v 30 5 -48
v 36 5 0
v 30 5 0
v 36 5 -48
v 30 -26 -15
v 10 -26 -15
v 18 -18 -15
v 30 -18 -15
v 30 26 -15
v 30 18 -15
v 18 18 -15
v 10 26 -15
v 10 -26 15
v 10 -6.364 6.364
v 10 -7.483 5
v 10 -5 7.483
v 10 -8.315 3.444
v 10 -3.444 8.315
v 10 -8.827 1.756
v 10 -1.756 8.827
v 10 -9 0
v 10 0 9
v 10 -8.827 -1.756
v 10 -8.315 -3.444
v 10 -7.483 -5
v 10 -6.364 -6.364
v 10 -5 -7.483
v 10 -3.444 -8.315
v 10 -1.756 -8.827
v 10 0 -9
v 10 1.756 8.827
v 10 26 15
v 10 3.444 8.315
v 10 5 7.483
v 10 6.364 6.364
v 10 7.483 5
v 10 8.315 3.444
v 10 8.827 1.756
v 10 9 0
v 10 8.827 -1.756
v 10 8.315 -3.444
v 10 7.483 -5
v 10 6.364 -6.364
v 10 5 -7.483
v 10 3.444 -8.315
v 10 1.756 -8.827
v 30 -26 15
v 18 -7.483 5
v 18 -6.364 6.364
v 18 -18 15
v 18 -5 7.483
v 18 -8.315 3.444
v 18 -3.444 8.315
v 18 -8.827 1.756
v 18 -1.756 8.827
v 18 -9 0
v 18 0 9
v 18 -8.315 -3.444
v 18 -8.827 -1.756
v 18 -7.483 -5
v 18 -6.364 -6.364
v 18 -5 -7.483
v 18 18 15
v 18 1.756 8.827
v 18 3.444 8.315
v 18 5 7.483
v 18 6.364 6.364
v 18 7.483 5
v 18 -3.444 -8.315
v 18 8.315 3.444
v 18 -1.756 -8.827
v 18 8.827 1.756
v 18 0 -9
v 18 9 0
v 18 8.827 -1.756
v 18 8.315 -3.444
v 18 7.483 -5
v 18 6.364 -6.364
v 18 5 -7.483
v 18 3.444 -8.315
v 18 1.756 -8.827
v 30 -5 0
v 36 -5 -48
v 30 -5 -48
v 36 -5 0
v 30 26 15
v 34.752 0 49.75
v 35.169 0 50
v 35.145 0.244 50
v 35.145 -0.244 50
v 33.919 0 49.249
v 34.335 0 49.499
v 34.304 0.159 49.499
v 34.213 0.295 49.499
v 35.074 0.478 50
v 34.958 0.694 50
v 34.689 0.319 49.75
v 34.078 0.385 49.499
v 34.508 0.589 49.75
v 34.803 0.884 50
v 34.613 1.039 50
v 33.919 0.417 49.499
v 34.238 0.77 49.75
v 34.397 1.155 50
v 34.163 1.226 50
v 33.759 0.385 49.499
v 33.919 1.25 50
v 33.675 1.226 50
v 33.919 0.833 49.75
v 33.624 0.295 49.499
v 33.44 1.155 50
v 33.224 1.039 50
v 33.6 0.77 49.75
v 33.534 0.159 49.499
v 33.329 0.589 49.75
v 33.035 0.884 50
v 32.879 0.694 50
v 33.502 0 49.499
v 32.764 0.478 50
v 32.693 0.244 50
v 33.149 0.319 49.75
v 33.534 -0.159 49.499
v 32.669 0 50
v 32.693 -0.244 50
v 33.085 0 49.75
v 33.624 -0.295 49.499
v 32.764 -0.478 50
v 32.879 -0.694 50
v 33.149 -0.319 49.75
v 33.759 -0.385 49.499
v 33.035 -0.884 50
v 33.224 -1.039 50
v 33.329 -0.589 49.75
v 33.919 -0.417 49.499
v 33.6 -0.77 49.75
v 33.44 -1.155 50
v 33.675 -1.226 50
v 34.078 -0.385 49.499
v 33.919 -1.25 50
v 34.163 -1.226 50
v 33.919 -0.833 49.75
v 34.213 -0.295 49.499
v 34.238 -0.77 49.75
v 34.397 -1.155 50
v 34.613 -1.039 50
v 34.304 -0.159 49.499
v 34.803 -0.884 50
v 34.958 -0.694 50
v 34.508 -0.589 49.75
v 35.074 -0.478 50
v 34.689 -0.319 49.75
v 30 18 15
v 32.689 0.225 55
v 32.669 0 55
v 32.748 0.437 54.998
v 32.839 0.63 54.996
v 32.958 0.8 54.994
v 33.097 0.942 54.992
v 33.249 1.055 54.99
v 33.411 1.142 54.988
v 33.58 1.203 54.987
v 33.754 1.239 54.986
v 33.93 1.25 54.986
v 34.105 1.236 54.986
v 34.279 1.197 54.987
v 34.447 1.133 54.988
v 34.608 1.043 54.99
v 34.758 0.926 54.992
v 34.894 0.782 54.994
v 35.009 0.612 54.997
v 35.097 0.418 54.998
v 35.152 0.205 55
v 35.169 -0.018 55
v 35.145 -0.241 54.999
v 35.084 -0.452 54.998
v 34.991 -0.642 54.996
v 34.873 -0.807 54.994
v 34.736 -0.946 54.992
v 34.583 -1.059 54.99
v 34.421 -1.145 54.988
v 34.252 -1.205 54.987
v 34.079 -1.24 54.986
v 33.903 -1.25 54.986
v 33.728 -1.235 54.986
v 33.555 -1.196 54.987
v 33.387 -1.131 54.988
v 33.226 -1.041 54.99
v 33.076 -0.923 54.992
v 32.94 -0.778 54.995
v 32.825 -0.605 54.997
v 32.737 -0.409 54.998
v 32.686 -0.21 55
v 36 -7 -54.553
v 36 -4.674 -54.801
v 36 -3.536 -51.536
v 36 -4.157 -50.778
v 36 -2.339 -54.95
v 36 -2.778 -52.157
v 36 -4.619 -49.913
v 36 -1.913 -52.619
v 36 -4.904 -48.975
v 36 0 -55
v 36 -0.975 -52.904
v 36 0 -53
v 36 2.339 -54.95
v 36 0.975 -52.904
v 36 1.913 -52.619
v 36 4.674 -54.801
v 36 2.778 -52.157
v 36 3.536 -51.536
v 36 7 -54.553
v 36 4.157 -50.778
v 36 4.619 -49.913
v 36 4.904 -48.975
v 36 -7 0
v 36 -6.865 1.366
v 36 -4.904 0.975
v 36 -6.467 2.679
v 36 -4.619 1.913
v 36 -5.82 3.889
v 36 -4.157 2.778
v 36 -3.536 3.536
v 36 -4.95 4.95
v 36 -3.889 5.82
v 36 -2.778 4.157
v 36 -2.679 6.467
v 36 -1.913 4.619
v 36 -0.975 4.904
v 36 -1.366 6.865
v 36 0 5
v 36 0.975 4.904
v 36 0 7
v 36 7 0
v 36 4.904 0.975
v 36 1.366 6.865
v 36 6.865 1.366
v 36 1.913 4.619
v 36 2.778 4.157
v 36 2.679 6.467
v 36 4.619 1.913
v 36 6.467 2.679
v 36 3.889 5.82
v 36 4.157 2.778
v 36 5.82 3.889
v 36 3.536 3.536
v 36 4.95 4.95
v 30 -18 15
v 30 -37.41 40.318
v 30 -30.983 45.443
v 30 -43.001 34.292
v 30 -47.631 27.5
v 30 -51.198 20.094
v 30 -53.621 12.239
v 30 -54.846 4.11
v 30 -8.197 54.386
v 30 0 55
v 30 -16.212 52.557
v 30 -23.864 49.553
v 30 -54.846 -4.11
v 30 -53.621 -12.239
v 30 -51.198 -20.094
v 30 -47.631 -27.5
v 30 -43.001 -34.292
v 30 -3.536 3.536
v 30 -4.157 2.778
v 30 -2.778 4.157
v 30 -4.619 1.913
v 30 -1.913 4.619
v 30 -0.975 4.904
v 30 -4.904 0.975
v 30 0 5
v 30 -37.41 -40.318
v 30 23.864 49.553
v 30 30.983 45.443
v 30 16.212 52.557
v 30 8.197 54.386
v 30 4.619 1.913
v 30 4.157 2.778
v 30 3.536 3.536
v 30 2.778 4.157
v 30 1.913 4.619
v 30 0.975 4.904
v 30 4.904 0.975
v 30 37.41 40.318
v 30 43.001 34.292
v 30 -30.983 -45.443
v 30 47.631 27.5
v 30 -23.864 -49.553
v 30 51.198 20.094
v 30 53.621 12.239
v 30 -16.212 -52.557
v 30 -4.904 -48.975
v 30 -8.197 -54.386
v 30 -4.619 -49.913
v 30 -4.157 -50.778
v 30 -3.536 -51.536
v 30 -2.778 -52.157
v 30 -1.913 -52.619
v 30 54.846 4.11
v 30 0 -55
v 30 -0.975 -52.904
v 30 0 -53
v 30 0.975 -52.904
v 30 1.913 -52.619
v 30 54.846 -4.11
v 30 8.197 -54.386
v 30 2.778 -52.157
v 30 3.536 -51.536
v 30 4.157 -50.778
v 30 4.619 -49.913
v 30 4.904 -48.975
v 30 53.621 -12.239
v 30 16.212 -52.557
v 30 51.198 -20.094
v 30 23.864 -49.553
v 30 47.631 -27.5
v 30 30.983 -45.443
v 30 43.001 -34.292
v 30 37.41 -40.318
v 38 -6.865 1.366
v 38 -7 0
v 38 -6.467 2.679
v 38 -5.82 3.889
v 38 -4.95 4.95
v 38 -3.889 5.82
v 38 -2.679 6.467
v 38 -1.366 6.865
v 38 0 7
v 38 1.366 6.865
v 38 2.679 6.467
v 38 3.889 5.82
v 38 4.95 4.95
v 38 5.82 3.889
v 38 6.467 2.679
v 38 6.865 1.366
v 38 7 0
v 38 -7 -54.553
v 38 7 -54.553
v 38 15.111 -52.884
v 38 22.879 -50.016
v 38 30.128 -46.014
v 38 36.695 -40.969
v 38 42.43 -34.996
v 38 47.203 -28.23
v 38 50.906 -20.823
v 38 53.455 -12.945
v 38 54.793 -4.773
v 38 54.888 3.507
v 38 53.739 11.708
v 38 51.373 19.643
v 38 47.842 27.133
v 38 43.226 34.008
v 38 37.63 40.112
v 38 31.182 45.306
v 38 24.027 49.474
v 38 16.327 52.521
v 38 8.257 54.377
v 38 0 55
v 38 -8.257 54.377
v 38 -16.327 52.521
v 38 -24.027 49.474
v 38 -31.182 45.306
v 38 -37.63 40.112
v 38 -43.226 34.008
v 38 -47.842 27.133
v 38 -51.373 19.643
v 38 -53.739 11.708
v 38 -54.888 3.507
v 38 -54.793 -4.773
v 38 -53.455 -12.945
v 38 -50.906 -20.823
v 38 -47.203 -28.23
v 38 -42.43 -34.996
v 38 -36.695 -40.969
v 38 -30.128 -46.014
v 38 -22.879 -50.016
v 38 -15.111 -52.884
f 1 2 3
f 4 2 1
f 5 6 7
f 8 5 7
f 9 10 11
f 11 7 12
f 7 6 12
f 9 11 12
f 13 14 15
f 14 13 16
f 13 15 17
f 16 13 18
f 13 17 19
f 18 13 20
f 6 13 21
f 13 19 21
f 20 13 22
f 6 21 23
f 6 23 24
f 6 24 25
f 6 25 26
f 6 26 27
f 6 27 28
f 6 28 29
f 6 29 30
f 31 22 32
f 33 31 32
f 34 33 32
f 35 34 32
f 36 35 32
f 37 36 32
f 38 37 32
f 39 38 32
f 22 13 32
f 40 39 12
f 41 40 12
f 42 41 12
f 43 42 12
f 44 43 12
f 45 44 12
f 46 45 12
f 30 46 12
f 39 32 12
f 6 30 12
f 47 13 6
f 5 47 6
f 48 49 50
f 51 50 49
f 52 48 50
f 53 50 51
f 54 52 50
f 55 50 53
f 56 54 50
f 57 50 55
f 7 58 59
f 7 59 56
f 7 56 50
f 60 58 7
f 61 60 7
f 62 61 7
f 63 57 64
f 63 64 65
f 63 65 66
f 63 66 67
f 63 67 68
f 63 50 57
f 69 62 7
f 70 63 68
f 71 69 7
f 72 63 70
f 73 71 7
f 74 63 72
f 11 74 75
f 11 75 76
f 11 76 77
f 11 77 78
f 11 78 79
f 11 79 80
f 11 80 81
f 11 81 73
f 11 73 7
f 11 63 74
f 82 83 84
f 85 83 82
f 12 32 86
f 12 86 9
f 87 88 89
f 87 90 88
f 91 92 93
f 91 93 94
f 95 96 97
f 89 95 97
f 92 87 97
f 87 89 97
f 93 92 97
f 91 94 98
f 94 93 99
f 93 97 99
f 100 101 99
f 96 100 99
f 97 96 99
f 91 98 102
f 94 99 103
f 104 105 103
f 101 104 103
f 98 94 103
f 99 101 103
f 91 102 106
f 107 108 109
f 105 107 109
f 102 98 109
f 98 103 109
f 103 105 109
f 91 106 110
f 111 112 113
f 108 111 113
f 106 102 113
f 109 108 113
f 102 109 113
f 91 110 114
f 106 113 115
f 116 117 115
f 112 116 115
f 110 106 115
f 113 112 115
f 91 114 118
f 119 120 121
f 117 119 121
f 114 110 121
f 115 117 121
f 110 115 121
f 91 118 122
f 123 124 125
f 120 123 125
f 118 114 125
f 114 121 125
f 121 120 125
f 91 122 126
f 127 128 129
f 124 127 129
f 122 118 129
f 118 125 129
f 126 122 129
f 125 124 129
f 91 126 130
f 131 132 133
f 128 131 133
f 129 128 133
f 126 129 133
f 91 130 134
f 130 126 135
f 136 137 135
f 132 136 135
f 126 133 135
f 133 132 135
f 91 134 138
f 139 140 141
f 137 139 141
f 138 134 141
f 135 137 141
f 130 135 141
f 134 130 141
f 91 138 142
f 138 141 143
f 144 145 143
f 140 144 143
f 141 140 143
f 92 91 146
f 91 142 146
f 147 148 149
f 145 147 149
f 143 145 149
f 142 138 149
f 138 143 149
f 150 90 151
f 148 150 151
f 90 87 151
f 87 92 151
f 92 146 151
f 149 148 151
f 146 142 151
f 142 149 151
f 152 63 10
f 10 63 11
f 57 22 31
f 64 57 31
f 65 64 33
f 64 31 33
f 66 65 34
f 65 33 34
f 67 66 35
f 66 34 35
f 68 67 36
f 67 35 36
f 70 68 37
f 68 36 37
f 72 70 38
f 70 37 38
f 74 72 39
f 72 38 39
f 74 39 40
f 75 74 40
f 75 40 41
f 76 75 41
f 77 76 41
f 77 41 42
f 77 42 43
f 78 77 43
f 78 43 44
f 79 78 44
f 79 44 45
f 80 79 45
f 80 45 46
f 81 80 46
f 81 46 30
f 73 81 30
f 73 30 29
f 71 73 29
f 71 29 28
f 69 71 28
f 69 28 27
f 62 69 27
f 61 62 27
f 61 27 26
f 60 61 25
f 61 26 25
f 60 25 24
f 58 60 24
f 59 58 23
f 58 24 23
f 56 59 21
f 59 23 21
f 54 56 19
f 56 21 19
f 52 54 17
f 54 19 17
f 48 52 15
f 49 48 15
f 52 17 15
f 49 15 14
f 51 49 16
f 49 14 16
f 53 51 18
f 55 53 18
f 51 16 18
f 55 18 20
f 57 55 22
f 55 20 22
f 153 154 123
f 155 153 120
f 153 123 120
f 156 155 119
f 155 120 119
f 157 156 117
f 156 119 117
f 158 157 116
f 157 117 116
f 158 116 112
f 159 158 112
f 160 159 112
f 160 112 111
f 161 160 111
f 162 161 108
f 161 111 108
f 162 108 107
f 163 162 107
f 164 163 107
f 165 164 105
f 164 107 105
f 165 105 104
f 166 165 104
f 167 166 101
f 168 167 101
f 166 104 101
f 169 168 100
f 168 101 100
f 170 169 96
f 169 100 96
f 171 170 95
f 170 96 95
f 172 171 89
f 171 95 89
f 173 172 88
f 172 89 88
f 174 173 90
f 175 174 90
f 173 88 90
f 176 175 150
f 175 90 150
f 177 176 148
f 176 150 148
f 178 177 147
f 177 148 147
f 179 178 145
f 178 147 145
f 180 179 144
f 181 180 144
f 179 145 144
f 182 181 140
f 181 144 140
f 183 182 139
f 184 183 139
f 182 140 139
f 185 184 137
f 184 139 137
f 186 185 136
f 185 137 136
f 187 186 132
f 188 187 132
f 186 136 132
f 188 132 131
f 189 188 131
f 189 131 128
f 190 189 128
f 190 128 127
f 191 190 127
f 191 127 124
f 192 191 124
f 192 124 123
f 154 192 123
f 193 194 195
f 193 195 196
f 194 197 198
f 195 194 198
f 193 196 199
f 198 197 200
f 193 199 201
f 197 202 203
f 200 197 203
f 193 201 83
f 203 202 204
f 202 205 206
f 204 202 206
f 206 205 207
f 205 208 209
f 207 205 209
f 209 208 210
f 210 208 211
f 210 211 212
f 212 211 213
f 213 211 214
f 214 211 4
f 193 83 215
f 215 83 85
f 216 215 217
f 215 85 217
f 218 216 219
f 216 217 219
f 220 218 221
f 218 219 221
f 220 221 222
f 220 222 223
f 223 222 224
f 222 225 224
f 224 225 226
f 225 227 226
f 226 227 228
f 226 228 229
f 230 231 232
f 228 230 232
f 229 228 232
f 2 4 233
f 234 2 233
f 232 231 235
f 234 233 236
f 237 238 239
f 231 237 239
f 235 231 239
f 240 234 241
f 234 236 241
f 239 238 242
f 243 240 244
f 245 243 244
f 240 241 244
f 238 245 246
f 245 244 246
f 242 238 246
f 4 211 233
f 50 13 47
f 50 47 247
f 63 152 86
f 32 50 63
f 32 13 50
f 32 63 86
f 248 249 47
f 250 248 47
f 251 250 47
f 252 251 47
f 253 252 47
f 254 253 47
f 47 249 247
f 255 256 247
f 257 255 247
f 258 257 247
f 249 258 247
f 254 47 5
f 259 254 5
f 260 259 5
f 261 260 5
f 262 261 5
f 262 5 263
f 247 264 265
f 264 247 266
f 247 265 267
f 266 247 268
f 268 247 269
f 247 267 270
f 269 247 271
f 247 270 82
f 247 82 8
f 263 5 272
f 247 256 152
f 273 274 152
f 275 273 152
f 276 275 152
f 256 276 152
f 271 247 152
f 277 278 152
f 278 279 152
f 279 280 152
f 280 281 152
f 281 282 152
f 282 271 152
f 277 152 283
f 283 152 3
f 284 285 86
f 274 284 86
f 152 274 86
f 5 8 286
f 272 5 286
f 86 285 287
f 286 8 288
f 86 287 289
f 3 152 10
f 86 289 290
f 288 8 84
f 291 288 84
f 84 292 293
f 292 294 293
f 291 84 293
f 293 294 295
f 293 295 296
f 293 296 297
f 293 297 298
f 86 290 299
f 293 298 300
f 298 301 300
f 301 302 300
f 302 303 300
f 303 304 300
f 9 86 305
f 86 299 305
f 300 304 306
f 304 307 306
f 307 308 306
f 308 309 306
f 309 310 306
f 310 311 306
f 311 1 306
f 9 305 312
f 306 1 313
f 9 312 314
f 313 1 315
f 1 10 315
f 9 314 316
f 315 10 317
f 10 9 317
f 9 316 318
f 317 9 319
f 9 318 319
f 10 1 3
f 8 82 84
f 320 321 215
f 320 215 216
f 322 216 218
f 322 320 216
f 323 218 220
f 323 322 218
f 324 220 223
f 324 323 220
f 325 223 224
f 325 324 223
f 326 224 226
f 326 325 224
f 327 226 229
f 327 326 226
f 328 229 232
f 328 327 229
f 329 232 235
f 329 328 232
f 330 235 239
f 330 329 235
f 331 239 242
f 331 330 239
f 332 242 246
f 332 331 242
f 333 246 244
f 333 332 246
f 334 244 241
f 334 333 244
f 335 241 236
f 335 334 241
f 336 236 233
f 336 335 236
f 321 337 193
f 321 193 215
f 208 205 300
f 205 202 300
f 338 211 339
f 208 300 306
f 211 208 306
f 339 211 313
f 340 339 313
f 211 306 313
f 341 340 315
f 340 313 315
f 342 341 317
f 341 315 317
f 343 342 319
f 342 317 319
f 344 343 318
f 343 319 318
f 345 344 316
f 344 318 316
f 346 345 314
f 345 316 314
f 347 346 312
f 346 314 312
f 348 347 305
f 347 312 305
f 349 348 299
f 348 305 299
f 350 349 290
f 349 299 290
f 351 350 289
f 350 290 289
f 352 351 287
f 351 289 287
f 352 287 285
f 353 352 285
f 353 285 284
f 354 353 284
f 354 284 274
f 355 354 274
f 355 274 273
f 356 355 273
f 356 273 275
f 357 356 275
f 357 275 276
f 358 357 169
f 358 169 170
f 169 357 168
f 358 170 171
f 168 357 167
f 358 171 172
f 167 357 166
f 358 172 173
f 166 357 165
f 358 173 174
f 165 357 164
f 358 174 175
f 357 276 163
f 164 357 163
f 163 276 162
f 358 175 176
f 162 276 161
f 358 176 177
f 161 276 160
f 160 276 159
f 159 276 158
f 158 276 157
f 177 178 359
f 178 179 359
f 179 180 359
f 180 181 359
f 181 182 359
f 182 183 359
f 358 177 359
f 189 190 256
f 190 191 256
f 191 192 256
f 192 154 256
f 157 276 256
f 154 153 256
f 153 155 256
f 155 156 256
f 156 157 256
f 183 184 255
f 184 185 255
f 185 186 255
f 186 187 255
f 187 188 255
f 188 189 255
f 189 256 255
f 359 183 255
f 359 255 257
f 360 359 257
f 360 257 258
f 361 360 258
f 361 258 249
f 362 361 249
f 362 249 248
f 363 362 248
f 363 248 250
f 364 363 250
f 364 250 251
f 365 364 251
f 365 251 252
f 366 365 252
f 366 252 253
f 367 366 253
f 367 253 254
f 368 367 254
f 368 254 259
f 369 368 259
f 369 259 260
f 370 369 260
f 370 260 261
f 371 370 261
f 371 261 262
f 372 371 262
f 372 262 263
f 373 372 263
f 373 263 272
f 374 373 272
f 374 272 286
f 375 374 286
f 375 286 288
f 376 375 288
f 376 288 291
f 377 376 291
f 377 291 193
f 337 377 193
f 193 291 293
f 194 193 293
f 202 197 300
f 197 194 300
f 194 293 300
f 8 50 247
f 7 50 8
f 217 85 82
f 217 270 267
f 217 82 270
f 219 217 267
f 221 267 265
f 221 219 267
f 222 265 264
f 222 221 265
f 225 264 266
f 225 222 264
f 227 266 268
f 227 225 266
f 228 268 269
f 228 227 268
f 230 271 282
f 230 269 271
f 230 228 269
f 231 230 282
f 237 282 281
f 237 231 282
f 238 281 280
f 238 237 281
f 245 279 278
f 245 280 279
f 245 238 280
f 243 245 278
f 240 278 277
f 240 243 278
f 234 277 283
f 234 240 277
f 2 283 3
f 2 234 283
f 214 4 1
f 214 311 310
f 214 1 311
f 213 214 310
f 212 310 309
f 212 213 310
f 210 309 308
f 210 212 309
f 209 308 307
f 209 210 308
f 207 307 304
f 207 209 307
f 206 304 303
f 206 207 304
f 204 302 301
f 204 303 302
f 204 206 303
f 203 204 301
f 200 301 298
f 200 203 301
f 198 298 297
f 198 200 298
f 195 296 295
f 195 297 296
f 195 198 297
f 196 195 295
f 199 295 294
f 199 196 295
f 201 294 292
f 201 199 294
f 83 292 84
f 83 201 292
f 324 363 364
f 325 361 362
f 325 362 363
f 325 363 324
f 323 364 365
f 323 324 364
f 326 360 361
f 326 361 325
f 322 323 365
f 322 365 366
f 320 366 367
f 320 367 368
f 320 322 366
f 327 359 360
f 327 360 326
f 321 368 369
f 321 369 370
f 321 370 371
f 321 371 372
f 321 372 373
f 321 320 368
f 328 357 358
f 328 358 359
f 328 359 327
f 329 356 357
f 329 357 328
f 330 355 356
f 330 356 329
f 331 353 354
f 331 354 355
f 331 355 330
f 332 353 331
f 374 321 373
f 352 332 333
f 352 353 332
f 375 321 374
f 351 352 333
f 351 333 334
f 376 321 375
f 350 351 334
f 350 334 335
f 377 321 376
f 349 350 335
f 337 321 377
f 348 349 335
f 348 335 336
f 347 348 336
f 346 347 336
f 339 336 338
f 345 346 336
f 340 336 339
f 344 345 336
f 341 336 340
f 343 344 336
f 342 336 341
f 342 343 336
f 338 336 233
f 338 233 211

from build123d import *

# Parameters (mm, degrees)
SKETCH_1_R             = 7.5
EXTRUDE_1_DEPTH        = 10
SKETCH_5_W             = 30
SKETCH_5_H             = 52
EXTRUDE_2_DEPTH        = 8
SKETCH_6_W             = 30
SKETCH_6_H             = 8
EXTRUDE_3_DEPTH        = 12
SKETCH_7_R             = 55
EXTRUDE_4_DEPTH        = 8
CUT_EXTRUDE_4_REACH    = 40
CUT_EXTRUDE_6_DEPTH    = 2
CUT_EXTRUDE_7_REACH    = 40
SKETCH_12_R            = 9
HOLE_WIZARD_M3_1_D     = 2.5
HOLE_WIZARD_M3_1_DEPTH = 5
HOLE_WIZARD_M3_1_TIP   = 0.751075774


with BuildPart() as part:
    # 草图1 → 凸台-拉伸1 (new body)
    with BuildSketch(Plane(origin=(0, 0, 0), x_dir=(0, 0, -1), z_dir=(1, 0, 0))):
        Circle(SKETCH_1_R)
    extrude(amount=EXTRUDE_1_DEPTH)

    # 草图5 → 凸台-拉伸2 (add)
    with BuildSketch(Plane(origin=(10, 0, 0), x_dir=(0, 0, -1), z_dir=(1, 0, 0))):
        Rectangle(SKETCH_5_W, SKETCH_5_H)
    extrude(amount=EXTRUDE_2_DEPTH)

    # 草图6 → 凸台-拉伸3 (add)
    with BuildSketch(Plane(origin=(18, 0, 0), x_dir=(0, 0, -1), z_dir=(1, 0, 0))):
        with Locations((0, 22)):
            Rectangle(SKETCH_6_W, SKETCH_6_H)
        with Locations((0, -22)):
            Rectangle(SKETCH_6_W, SKETCH_6_H)
    extrude(amount=EXTRUDE_3_DEPTH)

    # 草图7 → 凸台-拉伸4 (add)
    with BuildSketch(Plane(origin=(30, 0, 0), x_dir=(0, 0, -1), z_dir=(1, 0, 0))):
        Circle(SKETCH_7_R)
    extrude(amount=EXTRUDE_4_DEPTH)

    # 草图8 → 切除-拉伸4 (cut, up to next)
    with BuildSketch(Plane(origin=(38, 0, 0), x_dir=(0, 0, -1), z_dir=(1, 0, 0)), mode=Mode.PRIVATE) as cut_extrude_4_sk1:
        with BuildLine():
            Line((0, 5), (48, 5))
            ThreePointArc((48, 5), (53, 0), (48, -5))
            Line((48, -5), (0, -5))
            ThreePointArc((0, -5), (-5, 0), (0, 5))
        make_face()
    cut_extrude_4_tool1 = extrude(cut_extrude_4_sk1.sketch, amount=-CUT_EXTRUDE_4_REACH, mode=Mode.PRIVATE) & part.part
    add(cut_extrude_4_tool1.solids().sort_by_distance((38, 0, -24))[0], mode=Mode.SUBTRACT)

    # 草图11 → 切除-拉伸6 (cut)
    with BuildSketch(Plane(origin=(38, 0, 0), x_dir=(0, 0, -1), z_dir=(1, 0, 0))):
        with BuildLine():
            Line((0, 7), (54.552726788, 7))
            ThreePointArc((54.552726788, 7), (55, 0), (54.552726788, -7))
            Line((54.552726788, -7), (0, -7))
            ThreePointArc((0, -7), (-7, 0), (0, 7))
        make_face()
    extrude(amount=-CUT_EXTRUDE_6_DEPTH, mode=Mode.SUBTRACT)

    # 草图12 → 切除-拉伸7 (cut, up to next)
    with BuildSketch(Plane.ZY, mode=Mode.PRIVATE) as cut_extrude_7_sk1:
        Circle(SKETCH_12_R)
    cut_extrude_7_tool1 = extrude(cut_extrude_7_sk1.sketch, amount=-CUT_EXTRUDE_7_REACH, mode=Mode.PRIVATE) & part.part
    add(cut_extrude_7_tool1.solids().sort_by_distance((0, 0, 0))[0], mode=Mode.SUBTRACT)

    # M3 螺纹孔1
    with Locations(Plane(origin=(33.918718573, 0, 55), x_dir=(1, 0, 0), z_dir=(0, 0, 1))):
        with Locations((0, 0)):
            Hole(HOLE_WIZARD_M3_1_D / 2, depth=HOLE_WIZARD_M3_1_DEPTH)
            with Locations((0, 0, -(HOLE_WIZARD_M3_1_DEPTH + HOLE_WIZARD_M3_1_TIP / 2))):  # 118° drill point
                Cone(0, HOLE_WIZARD_M3_1_D / 2, HOLE_WIZARD_M3_1_TIP, mode=Mode.SUBTRACT)


solid = part.part
